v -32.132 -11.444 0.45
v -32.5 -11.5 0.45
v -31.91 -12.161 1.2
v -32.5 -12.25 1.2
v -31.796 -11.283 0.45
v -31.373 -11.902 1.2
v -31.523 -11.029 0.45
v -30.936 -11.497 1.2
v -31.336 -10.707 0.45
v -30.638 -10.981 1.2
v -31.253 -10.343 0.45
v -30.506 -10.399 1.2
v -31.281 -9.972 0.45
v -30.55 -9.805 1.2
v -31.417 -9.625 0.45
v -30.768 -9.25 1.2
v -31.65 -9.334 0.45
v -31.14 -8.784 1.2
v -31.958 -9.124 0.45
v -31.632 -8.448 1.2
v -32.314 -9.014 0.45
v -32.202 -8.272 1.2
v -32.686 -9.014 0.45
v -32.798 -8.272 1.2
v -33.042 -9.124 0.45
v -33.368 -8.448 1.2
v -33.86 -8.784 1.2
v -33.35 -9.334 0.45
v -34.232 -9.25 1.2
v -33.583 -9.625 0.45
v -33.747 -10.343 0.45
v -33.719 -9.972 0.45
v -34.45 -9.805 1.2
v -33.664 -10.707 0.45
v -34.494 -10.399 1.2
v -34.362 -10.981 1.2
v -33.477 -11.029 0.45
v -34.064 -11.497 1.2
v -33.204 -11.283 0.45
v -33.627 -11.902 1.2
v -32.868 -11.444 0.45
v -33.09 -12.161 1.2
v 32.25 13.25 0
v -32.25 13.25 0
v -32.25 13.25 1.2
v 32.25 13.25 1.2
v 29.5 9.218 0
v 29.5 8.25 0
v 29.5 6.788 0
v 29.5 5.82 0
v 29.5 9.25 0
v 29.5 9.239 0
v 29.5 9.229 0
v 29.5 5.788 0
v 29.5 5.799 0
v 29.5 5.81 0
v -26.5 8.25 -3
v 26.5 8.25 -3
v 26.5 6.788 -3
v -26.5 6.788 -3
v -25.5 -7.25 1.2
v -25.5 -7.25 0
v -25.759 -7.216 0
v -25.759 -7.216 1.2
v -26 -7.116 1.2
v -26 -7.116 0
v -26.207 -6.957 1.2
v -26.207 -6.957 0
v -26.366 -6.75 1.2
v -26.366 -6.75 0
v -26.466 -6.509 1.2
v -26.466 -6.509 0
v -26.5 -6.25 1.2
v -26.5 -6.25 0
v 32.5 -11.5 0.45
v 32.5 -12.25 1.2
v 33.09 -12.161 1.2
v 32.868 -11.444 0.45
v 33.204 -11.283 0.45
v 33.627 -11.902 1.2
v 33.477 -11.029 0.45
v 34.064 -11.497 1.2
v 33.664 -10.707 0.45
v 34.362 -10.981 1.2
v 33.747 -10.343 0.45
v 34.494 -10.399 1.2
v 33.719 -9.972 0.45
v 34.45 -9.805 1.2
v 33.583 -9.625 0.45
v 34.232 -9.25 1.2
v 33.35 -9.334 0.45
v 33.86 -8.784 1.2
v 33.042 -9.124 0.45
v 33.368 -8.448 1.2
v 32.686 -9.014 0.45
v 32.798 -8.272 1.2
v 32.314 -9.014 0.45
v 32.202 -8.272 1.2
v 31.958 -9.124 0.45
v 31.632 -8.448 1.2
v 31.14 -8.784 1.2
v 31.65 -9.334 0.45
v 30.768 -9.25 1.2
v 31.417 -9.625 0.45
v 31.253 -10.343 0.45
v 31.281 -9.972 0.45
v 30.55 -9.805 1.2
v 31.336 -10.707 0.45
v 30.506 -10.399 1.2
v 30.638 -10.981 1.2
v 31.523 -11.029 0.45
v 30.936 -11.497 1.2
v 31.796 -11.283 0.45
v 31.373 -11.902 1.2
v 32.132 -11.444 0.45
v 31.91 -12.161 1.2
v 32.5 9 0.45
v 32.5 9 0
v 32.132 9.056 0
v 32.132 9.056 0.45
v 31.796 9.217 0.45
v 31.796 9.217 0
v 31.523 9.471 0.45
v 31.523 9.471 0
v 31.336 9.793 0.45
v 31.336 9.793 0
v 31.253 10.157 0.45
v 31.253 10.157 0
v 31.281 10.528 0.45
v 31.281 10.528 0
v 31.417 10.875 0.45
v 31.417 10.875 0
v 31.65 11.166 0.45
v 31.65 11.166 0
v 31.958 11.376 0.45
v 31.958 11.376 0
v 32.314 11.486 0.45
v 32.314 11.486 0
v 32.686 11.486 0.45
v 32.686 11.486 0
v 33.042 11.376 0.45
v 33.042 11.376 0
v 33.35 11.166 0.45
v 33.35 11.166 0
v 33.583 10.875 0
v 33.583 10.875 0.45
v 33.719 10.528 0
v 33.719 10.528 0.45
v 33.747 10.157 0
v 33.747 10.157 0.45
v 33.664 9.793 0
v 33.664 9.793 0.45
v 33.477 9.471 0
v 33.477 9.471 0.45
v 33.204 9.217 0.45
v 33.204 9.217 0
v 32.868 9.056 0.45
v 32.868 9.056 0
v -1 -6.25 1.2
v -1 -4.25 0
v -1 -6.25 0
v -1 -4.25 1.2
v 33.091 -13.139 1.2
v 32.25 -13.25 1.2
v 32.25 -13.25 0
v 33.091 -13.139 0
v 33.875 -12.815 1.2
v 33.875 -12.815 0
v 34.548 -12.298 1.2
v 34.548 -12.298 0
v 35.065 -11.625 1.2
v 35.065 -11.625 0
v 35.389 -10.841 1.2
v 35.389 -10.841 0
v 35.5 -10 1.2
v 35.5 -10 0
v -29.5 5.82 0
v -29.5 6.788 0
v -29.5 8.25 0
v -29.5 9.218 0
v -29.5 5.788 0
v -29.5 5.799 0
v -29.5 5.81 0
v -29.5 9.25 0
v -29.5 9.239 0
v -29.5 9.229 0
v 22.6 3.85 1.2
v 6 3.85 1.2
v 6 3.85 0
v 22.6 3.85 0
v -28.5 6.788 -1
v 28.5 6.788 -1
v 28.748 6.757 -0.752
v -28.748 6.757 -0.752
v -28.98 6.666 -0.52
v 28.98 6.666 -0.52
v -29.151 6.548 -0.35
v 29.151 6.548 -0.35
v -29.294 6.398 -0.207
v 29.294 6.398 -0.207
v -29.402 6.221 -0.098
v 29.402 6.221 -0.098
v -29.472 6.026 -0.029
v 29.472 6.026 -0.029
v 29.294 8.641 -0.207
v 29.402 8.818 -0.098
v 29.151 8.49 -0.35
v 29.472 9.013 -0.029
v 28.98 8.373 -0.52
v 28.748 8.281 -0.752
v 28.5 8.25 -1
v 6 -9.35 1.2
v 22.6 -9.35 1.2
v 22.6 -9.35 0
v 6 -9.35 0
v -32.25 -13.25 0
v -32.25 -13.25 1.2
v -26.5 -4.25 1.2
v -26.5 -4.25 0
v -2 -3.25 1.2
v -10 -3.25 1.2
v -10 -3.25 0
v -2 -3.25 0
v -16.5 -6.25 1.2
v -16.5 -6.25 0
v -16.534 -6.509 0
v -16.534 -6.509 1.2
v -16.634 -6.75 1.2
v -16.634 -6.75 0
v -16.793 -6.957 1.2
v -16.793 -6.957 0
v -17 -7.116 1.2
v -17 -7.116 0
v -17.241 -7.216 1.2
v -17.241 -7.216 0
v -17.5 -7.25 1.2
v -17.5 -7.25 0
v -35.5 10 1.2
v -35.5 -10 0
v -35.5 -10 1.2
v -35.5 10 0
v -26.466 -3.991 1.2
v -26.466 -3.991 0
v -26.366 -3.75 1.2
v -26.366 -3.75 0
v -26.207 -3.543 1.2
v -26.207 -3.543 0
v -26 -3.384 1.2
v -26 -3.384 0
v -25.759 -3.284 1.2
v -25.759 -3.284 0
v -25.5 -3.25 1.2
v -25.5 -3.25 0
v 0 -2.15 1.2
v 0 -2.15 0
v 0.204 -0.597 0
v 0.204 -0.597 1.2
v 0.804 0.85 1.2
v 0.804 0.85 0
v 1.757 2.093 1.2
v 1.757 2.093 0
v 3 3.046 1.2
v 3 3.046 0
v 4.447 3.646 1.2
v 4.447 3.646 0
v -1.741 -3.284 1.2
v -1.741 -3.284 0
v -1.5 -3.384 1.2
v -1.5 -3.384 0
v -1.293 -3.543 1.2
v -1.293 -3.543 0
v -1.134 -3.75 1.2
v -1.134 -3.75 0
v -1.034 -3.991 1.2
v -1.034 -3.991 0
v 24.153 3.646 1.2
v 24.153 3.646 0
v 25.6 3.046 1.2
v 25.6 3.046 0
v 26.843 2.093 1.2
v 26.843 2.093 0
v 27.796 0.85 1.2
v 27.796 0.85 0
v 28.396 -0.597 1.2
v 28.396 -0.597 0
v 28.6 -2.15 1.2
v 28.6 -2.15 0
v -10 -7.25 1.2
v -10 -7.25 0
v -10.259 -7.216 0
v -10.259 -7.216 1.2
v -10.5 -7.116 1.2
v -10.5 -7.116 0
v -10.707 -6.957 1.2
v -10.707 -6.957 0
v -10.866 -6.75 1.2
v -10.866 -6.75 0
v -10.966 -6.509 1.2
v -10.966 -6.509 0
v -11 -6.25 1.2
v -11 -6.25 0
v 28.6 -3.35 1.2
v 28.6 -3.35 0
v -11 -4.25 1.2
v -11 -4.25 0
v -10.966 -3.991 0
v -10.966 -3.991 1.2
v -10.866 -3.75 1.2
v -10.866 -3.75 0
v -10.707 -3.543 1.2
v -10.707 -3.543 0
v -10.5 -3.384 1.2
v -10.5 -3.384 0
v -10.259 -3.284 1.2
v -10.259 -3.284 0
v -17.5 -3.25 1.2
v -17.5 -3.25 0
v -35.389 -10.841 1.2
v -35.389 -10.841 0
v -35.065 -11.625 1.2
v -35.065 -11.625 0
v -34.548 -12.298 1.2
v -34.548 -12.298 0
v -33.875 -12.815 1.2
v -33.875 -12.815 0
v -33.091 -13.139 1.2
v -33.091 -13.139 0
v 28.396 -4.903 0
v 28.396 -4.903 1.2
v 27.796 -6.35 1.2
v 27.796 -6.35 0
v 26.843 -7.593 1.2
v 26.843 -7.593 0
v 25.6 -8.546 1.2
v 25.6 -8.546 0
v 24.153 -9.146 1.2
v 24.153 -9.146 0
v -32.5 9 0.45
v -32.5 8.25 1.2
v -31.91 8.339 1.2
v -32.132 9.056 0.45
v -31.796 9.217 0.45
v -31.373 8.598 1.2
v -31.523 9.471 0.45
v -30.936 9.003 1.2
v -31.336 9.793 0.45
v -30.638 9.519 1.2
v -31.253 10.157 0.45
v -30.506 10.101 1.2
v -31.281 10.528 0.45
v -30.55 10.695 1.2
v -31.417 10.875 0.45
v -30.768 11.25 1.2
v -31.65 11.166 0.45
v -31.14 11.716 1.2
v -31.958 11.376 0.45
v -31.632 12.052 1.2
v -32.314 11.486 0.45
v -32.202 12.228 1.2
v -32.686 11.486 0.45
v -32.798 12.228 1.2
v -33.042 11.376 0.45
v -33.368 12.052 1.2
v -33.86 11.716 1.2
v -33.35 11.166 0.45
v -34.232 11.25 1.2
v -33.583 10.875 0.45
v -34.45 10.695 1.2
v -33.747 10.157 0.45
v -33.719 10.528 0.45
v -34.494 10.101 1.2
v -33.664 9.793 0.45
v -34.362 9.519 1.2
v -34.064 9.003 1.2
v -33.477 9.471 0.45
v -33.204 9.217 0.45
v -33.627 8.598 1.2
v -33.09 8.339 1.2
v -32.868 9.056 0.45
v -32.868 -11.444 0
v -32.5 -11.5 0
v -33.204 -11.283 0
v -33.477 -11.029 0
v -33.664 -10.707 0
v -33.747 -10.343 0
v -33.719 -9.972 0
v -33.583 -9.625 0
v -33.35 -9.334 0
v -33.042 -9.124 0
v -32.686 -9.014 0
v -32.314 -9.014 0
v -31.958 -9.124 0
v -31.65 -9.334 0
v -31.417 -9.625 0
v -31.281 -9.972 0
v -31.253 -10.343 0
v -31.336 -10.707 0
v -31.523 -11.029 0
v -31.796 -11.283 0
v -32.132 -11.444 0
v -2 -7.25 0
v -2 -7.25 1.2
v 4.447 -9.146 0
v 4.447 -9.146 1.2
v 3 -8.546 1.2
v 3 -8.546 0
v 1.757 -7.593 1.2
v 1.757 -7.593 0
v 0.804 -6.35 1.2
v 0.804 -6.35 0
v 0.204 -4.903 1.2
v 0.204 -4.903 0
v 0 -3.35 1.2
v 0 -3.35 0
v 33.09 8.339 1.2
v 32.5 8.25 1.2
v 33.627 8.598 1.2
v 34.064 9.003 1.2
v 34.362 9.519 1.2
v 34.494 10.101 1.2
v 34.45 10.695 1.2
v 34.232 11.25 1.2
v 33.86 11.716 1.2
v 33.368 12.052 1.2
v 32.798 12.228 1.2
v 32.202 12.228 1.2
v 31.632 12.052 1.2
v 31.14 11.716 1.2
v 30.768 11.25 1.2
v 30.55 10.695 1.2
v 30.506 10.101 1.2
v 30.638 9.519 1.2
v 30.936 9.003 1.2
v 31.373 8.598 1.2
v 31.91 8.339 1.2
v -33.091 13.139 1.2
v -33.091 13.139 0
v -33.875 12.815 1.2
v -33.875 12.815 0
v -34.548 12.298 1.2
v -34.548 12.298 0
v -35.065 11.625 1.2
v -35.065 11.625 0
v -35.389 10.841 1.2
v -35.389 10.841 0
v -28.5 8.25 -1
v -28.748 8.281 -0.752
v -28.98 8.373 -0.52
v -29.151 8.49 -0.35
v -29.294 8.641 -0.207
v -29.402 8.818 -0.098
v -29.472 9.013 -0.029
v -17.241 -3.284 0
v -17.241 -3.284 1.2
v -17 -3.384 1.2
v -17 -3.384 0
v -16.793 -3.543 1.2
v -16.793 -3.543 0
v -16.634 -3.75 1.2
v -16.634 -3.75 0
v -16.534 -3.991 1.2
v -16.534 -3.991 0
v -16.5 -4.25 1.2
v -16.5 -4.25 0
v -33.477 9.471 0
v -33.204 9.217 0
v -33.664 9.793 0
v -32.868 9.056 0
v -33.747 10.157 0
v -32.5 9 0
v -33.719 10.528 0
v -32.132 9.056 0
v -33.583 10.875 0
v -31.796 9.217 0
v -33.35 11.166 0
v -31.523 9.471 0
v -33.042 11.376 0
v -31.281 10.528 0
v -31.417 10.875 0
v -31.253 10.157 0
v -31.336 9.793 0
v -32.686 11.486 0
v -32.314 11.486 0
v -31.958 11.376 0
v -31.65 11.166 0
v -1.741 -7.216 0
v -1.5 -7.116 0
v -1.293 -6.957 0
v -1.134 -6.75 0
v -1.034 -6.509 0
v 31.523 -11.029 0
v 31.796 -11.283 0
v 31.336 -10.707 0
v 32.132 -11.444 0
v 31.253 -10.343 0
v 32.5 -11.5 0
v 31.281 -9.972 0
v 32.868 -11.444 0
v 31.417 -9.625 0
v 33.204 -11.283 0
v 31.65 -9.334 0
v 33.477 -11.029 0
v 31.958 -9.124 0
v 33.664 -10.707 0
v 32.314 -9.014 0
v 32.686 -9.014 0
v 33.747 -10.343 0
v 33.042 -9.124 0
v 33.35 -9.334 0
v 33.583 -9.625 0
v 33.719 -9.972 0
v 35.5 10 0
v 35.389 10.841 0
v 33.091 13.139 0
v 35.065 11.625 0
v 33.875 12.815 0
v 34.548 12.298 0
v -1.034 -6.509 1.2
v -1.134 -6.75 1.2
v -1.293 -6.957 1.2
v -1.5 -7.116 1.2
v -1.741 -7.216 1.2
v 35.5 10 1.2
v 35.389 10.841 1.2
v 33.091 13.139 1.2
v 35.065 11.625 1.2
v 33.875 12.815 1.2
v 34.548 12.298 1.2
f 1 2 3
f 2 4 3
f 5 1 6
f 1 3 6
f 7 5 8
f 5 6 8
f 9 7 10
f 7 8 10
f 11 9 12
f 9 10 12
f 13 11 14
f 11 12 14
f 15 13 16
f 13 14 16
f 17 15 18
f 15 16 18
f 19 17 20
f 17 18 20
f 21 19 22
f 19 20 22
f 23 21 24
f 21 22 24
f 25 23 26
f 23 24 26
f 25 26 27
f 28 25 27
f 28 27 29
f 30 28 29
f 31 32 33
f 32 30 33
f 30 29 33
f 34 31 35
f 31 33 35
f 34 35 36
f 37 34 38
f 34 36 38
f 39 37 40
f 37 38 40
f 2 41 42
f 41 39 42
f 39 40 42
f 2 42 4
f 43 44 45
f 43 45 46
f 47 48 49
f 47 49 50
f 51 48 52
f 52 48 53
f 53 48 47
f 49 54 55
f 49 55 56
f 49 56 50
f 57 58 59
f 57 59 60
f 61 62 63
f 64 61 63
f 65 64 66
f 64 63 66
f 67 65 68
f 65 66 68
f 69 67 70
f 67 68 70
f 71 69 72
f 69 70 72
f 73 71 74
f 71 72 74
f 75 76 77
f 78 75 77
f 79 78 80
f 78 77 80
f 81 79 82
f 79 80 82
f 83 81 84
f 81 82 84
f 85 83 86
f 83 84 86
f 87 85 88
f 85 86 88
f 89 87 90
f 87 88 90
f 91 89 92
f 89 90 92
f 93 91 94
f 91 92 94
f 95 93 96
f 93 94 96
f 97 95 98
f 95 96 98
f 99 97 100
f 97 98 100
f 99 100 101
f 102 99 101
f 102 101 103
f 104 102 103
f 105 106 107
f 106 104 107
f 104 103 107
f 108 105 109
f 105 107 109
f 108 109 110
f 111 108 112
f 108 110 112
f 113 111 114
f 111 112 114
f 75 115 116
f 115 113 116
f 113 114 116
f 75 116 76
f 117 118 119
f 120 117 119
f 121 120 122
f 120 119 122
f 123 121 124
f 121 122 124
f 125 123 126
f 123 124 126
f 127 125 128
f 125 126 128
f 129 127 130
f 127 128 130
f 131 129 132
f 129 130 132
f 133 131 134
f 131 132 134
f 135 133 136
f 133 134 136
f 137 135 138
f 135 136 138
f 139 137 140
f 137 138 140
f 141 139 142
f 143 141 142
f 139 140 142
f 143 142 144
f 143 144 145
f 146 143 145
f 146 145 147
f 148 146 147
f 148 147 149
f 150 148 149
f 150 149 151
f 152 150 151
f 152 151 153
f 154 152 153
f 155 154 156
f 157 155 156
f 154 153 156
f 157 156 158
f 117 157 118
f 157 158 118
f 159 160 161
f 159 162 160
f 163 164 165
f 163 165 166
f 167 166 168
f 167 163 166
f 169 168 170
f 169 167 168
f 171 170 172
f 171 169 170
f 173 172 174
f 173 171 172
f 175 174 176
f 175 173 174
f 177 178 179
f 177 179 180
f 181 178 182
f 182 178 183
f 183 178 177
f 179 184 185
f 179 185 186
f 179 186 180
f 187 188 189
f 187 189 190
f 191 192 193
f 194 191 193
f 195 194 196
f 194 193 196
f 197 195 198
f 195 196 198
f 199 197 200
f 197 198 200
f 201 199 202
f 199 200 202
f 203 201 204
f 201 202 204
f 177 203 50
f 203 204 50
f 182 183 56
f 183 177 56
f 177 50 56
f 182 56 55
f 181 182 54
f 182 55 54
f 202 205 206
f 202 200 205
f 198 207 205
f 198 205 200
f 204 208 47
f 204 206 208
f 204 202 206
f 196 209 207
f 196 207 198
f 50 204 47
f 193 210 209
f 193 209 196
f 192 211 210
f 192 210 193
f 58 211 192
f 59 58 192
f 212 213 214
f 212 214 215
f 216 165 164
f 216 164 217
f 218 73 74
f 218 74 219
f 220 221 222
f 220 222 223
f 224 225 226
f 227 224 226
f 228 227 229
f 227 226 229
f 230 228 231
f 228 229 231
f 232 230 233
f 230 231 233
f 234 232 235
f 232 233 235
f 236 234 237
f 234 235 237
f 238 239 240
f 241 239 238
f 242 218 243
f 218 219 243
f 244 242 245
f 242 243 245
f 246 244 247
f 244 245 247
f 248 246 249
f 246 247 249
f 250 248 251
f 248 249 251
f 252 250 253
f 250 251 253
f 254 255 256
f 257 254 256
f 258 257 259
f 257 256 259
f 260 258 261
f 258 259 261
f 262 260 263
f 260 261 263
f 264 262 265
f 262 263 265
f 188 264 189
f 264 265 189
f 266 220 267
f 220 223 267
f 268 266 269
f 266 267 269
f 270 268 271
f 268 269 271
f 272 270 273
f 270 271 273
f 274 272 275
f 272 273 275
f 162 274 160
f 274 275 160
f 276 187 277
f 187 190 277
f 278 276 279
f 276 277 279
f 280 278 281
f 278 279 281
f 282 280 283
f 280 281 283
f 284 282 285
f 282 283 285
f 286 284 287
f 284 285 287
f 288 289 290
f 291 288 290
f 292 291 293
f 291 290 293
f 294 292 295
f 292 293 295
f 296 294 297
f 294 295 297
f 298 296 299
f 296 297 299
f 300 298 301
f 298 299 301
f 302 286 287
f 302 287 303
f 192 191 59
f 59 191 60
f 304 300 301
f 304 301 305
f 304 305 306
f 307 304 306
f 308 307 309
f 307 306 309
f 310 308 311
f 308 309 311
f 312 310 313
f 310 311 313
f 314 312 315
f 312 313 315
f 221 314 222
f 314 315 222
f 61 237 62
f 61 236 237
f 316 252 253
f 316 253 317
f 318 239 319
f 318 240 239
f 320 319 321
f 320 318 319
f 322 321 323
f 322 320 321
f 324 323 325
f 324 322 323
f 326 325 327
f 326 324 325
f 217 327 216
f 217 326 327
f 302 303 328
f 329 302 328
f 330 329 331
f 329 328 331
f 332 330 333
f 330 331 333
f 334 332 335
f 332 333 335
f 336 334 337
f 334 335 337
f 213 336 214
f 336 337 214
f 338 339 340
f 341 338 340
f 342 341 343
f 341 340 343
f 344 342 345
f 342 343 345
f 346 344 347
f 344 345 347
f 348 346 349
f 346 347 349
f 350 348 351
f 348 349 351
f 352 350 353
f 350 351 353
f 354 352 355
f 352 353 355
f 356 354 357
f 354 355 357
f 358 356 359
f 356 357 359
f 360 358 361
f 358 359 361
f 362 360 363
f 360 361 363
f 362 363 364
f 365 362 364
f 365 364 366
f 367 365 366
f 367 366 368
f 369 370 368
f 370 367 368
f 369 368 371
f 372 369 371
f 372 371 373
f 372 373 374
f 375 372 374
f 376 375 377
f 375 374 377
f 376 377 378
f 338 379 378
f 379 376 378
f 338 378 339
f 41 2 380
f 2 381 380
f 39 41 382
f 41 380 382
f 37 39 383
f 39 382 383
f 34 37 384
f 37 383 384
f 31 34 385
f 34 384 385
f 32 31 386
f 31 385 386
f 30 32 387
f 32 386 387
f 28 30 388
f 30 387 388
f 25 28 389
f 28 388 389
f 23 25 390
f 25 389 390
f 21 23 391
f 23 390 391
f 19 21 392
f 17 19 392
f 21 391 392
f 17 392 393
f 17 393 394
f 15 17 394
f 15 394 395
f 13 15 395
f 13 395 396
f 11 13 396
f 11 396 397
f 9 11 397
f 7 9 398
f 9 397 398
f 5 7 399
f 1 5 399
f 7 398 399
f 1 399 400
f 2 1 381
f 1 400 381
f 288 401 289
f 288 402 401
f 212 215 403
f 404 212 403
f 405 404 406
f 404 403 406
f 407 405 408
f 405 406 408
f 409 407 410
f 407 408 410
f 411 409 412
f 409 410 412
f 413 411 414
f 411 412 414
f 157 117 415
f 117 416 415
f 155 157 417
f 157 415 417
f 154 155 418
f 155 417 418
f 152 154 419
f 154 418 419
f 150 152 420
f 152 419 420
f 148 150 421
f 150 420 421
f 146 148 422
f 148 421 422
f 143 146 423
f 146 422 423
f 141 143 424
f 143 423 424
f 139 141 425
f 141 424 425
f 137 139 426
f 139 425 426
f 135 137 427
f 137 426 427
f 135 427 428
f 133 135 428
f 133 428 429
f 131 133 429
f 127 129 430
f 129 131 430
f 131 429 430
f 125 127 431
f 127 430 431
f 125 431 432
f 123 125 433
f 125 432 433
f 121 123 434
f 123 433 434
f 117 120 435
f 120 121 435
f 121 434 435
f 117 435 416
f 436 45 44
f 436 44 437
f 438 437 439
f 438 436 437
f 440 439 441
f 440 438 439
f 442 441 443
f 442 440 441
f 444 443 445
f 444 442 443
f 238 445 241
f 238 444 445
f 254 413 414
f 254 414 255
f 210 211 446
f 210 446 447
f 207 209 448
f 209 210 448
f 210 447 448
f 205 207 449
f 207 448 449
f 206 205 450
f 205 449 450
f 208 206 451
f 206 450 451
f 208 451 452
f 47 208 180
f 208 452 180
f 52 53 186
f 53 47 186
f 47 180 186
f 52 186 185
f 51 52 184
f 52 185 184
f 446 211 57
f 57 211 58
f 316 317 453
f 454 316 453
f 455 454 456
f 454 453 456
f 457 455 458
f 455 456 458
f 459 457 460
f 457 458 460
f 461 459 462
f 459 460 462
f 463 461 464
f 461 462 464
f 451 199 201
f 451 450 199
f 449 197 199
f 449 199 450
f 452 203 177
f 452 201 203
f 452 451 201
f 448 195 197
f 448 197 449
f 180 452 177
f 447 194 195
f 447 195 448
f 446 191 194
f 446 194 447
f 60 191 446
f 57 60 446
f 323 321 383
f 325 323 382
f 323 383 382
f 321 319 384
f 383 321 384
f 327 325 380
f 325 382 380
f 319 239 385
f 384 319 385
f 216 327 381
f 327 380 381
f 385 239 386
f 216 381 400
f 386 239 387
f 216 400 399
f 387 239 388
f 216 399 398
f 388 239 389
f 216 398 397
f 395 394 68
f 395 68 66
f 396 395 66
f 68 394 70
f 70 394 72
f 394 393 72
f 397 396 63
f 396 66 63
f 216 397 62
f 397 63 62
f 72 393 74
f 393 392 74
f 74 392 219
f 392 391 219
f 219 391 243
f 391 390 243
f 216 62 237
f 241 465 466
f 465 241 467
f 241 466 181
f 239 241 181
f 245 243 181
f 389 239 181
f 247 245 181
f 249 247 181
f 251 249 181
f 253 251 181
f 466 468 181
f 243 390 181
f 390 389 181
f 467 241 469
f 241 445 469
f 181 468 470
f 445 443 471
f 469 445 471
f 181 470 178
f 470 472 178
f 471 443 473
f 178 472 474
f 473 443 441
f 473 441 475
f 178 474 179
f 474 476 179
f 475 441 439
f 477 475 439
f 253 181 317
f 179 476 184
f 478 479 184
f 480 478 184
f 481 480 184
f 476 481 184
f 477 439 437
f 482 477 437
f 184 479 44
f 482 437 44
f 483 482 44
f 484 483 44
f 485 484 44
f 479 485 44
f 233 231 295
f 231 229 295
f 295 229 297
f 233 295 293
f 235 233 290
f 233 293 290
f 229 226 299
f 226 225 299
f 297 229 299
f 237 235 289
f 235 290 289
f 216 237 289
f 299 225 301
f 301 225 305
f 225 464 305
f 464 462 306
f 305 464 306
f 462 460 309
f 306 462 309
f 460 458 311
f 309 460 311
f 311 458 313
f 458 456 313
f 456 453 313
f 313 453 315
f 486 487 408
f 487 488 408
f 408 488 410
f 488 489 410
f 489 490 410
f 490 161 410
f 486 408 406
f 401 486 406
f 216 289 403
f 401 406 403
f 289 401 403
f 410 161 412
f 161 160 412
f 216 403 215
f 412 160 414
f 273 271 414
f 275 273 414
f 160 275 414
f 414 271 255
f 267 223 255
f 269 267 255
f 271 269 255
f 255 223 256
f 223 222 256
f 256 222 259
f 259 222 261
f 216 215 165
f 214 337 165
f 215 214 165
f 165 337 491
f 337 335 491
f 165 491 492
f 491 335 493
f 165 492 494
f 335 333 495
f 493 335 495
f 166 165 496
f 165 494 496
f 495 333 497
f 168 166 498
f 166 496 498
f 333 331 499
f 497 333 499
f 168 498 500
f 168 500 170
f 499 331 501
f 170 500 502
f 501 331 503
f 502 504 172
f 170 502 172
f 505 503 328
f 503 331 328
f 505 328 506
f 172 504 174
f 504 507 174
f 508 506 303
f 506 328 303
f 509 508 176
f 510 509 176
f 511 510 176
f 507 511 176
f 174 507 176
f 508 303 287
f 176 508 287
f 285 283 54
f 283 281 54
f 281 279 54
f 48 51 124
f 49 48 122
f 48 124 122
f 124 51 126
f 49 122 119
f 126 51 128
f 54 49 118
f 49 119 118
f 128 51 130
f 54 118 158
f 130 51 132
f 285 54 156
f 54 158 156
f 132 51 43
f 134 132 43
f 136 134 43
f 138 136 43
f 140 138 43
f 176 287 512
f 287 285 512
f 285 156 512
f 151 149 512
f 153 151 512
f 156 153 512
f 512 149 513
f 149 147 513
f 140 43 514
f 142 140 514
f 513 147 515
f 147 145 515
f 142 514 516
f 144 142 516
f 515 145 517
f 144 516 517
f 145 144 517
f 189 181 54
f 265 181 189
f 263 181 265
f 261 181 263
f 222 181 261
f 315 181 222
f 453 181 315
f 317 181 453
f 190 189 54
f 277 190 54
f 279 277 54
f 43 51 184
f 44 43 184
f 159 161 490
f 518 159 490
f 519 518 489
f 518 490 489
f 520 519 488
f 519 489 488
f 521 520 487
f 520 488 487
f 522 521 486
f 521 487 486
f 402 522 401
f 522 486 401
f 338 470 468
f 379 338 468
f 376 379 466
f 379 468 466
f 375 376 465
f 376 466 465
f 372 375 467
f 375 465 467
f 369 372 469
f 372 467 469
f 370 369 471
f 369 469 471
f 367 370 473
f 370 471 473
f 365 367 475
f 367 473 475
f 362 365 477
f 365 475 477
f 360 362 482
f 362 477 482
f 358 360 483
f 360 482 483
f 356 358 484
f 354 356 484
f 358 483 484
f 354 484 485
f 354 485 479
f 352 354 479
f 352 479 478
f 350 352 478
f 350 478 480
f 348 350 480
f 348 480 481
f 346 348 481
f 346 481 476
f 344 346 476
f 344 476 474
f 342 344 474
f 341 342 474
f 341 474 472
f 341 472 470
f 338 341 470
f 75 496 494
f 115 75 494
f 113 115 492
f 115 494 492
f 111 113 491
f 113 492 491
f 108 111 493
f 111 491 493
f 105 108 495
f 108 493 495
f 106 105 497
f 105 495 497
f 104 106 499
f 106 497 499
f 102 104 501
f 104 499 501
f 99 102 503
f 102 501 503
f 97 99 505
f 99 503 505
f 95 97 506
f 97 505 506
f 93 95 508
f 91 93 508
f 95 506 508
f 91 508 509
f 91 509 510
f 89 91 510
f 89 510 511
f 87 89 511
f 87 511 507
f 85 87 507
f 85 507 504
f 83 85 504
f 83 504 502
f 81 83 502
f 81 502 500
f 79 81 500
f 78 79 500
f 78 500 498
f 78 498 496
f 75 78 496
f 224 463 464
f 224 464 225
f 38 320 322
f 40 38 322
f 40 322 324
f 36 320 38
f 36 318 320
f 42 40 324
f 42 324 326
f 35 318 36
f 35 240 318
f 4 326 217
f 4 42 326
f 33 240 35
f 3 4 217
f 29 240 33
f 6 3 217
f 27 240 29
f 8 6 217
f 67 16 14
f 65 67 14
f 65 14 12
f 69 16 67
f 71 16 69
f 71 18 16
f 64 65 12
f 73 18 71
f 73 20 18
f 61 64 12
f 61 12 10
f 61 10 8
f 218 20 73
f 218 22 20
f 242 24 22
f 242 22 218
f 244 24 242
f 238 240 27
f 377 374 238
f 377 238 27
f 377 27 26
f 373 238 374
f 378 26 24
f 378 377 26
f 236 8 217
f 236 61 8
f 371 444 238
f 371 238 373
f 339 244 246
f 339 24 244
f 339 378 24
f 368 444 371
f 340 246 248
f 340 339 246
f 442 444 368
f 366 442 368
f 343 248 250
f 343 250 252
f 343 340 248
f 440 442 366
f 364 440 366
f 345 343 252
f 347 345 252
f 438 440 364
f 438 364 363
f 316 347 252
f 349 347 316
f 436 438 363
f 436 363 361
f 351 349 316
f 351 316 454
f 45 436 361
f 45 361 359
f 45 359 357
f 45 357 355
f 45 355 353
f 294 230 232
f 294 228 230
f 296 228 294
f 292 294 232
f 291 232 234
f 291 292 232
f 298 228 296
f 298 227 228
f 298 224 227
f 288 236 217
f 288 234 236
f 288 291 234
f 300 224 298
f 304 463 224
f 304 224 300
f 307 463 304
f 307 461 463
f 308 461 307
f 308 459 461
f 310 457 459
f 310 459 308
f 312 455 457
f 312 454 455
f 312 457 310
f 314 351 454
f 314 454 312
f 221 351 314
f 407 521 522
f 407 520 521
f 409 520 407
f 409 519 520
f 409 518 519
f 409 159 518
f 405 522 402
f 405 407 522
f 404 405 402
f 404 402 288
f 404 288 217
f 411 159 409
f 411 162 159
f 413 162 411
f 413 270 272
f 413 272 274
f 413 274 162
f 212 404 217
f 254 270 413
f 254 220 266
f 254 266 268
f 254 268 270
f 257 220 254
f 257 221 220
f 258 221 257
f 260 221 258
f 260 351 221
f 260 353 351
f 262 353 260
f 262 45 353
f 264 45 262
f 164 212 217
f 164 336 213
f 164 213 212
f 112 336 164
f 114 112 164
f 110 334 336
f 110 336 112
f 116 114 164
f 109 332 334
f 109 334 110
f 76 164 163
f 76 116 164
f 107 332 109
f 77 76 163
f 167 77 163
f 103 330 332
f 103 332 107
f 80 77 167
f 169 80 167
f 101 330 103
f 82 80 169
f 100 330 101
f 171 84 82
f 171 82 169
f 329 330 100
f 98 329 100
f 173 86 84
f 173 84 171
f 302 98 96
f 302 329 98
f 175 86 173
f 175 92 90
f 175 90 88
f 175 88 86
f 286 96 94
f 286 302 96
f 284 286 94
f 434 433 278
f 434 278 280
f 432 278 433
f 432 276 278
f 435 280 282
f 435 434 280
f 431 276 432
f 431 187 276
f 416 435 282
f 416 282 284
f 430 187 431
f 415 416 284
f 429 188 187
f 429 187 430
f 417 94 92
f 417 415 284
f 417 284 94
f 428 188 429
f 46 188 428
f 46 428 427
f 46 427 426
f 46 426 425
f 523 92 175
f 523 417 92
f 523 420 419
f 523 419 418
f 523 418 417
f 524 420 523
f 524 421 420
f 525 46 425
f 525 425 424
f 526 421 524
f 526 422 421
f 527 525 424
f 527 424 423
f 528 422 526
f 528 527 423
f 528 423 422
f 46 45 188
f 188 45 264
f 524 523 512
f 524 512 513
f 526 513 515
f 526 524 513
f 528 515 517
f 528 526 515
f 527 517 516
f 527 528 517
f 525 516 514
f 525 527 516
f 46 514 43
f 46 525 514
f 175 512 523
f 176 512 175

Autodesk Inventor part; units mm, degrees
ref_plane "YZ Plane" through (0, 0, 0) normal (1, 0, 0) x (0, 1, 0)
ref_plane "XZ Plane" through (0, 0, 0) normal (0, 1, 0) x (-1, 0, 0)
ref_plane "XY Plane" through (0, 0, 0) normal (0, 0, 1) x (1, 0, 0)
sketch "Sketch1" plane through (0, 0, 0) normal (0, 0, 1) x (1, 0, 0)
  line L0 (-35.5, 13.25) -> (35.5, 13.25)
  line L1 (35.5, 13.25) -> (35.5, -13.25)
  line L2 (35.5, -13.25) -> (-35.5, -13.25)
  line L3 (-35.5, -13.25) -> (-35.5, 13.25)
  point P0 (0, 0)
  dimension "d0" = 26.5
  dimension "d1" = 71
  dimension "d2" = 35.5
  dimension "d3" = 13.25
extrude "Extrusion1" add sketch "Sketch1" along normal blind 1.2
fillet "Fillet1" radius 3.25 4 edges at (-35.5, 13.25, 0.6) (-35.5, -13.25, 0.6) (35.5, -13.25, 0.6) (35.5, 13.25, 0.6)
sketch "Sketch2" plane through (0, 0, 1.2) normal (0, 0, 1) x (1, 0, 0)
  line L0 (32.25, 13.25) -> (-32.25, 13.25) projected
  line L1 (-35.5, 10) -> (-35.5, -10) projected
  line L2 (-32.25, -13.25) -> (32.25, -13.25) projected
  line L3 (35.5, -10) -> (35.5, 10) projected
  point P0 (0, 0)
  point P1 (-32.5, 10.25)
  point P2 (32.5, 10.25)
  point P3 (32.5, -10.25)
  point P4 (-32.5, -10.25)
  dimension "d7" = 3
  dimension "d8" = 3
  dimension "d9" = 3
  dimension "d10" = 3
  dimension "d11" = 3
  dimension "d12" = 3
  dimension "d13" = 3
  dimension "d14" = 3
hole "Hole1" at (-32.5, 10.25, 1.2) at (32.5, 10.25, 1.2) at (32.5, -10.25, 1.2) at (-32.5, -10.25, 1.2) direction (0, 0, -1) diameter 2.5 depth 4 tip angle 118 countersink diameter 4 countersink angle 90
sketch "Sketch4" plane through (0, 0, 1.2) normal (0, 0, 1) x (1, 0, 0)
  line L0 (-11, -3.25) -> (-1, -3.25)
  line L1 (-1, -3.25) -> (-1, -7.25)
  line L2 (-1, -7.25) -> (-11, -7.25)
  line L3 (-11, -7.25) -> (-11, -3.25)
  line L4 (-35.5, 10) -> (-35.5, -10) projected
  line L5 (-32.25, -13.25) -> (32.25, -13.25) projected
  point P0 (0, 0)
  dimension "d28" = 24.5
  dimension "d29" = 34.5
  dimension "d30" = 6
  dimension "d31" = 10
extrude "Extrusion3" cut sketch "Sketch4" against normal blind 2
sketch "Sketch5" plane through (0, 0, 1.2) normal (0, 0, 1) x (1, 0, 0)
  line L0 (6.5, 1.75) -> (24.5, 1.75)
  line L1 (24.5, 1.75) -> (24.5, -5.25)
  line L2 (24.5, -5.25) -> (6.5, -5.25)
  line L3 (6.5, -5.25) -> (6.5, 1.75)
  line L4 (35.5, -10) -> (35.5, 10) projected
  line L5 (-32.25, -13.25) -> (32.25, -13.25) projected
  point P0 (0, 0)
  dimension "d34" = 11
  dimension "d35" = 29
  dimension "d36" = 15
  dimension "d37" = 8
extrude "Extrusion4" cut sketch "Sketch5" against normal blind 2
chamfer "Chamfer1" distance 2 angle 45 2 edges at (6.5, -5.25, 0.6) (24.5, -5.25, 0.6)
fillet "Fillet2" radius 1 4 edges at (-11, -3.25, 0.6) (-11, -7.25, 0.6) (-1, -7.25, 0.6) (-1, -3.25, 0.6)
sketch "Sketch7" plane through (0, 0, 1.2) normal (0, 0, 1) x (1, 0, 0)
  line L0 (0, 3.85) -> (28.6, 3.85)
  line L1 (28.6, 3.85) -> (28.6, -9.35)
  line L2 (28.6, -9.35) -> (0, -9.35)
  line L3 (0, -9.35) -> (0, 3.85)
  line L4 (-32.25, -13.25) -> (32.25, -13.25) projected
  line L5 (35.5, -10) -> (35.5, 10) projected
  point P0 (0, 0)
  dimension "d56" = 3.9
  dimension "d57" = 6.9
  dimension "d58" = 17.1
  dimension "d59" = 35.5
extrude "Extrusion6" cut sketch "Sketch7" against normal blind 2
fillet "Fillet3" radius 6 4 edges at (0, 3.85, 0.6) (0, -9.35, 0.6) (28.6, 3.85, 0.6) (28.6, -9.35, 0.6)
sketch "Sketch8" plane through (0, 0, 1.2) normal (0, 0, 1) x (1, 0, 0)
  line L0 (-26.5, -3.25) -> (-16.5, -3.25)
  line L1 (-16.5, -3.25) -> (-16.5, -7.25)
  line L2 (-16.5, -7.25) -> (-26.5, -7.25)
  line L3 (-26.5, -7.25) -> (-26.5, -3.25)
  line L4 (-35.5, 10) -> (-35.5, -10) projected
  line L5 (-10, -3.25) -> (-2, -3.25) projected
  line L6 (-2, -7.25) -> (-10, -7.25) projected
  point P0 (0, 0)
  dimension "d63" = 9
  dimension "d64" = 19
extrude "Extrusion7" cut sketch "Sketch8" against normal blind 2
fillet "Fillet4" radius 1 4 edges at (-26.5, -3.25, 0.6) (-26.5, -7.25, 0.6) (-16.5, -7.25, 0.6) (-16.5, -3.25, 0.6)
sketch "Sketch9" plane through (0, 0, 1.2) normal (0, 0, 1) x (1, 0, 0)
  line L0 (-1, -4.25) -> (-1, -6.25) projected
  line L1 (-11, -6.25) -> (-11, -4.25) projected
  line L2 (-26.5, -6.25) -> (-26.5, -4.25) projected
  line L3 (-16.5, -4.25) -> (-16.5, -6.25) projected
  line L4 (-35.5, 10) -> (-35.5, -10) projected
  point P0 (0, 0)
  dimension "d68" = 10
  dimension "d69" = 10
  dimension "d70" = 24.5
  dimension "d71" = 34.5
sketch "Sketch10" plane through (0, 0, 0) normal (0, 0, -1) x (-1, 0, 0)
  line L0 (-29.5, 8.25) -> (29.5, 8.25)
  line L1 (29.5, 8.25) -> (29.5, 6.7885)
  line L2 (29.5, 6.7885) -> (-29.5, 6.7885)
  line L3 (-29.5, 6.7885) -> (-29.5, 8.25)
  line L4 (-35.5, -10) -> (-35.5, 10) projected
  line L5 (35.5, 10) -> (35.5, -10) projected
  line L6 (-32.25, 13.25) -> (32.25, 13.25) projected
  point P0 (0, 0)
  dimension "d72" = 1.4615
  dimension "d73" = 6
  dimension "d74" = 6
  dimension "d75" = 5
extrude "Extrusion8" add sketch "Sketch10" along normal blind 3
fillet "Fillet5" radius 1 2 edges at (0, 6.7885, 0) (0, 8.25, 0)
chamfer "Chamfer4" distance 3 angle 45 2 edges at (29.5, 7.5192, -3) (-29.5, 7.5192, -3)
properties part number "cover-slave"
